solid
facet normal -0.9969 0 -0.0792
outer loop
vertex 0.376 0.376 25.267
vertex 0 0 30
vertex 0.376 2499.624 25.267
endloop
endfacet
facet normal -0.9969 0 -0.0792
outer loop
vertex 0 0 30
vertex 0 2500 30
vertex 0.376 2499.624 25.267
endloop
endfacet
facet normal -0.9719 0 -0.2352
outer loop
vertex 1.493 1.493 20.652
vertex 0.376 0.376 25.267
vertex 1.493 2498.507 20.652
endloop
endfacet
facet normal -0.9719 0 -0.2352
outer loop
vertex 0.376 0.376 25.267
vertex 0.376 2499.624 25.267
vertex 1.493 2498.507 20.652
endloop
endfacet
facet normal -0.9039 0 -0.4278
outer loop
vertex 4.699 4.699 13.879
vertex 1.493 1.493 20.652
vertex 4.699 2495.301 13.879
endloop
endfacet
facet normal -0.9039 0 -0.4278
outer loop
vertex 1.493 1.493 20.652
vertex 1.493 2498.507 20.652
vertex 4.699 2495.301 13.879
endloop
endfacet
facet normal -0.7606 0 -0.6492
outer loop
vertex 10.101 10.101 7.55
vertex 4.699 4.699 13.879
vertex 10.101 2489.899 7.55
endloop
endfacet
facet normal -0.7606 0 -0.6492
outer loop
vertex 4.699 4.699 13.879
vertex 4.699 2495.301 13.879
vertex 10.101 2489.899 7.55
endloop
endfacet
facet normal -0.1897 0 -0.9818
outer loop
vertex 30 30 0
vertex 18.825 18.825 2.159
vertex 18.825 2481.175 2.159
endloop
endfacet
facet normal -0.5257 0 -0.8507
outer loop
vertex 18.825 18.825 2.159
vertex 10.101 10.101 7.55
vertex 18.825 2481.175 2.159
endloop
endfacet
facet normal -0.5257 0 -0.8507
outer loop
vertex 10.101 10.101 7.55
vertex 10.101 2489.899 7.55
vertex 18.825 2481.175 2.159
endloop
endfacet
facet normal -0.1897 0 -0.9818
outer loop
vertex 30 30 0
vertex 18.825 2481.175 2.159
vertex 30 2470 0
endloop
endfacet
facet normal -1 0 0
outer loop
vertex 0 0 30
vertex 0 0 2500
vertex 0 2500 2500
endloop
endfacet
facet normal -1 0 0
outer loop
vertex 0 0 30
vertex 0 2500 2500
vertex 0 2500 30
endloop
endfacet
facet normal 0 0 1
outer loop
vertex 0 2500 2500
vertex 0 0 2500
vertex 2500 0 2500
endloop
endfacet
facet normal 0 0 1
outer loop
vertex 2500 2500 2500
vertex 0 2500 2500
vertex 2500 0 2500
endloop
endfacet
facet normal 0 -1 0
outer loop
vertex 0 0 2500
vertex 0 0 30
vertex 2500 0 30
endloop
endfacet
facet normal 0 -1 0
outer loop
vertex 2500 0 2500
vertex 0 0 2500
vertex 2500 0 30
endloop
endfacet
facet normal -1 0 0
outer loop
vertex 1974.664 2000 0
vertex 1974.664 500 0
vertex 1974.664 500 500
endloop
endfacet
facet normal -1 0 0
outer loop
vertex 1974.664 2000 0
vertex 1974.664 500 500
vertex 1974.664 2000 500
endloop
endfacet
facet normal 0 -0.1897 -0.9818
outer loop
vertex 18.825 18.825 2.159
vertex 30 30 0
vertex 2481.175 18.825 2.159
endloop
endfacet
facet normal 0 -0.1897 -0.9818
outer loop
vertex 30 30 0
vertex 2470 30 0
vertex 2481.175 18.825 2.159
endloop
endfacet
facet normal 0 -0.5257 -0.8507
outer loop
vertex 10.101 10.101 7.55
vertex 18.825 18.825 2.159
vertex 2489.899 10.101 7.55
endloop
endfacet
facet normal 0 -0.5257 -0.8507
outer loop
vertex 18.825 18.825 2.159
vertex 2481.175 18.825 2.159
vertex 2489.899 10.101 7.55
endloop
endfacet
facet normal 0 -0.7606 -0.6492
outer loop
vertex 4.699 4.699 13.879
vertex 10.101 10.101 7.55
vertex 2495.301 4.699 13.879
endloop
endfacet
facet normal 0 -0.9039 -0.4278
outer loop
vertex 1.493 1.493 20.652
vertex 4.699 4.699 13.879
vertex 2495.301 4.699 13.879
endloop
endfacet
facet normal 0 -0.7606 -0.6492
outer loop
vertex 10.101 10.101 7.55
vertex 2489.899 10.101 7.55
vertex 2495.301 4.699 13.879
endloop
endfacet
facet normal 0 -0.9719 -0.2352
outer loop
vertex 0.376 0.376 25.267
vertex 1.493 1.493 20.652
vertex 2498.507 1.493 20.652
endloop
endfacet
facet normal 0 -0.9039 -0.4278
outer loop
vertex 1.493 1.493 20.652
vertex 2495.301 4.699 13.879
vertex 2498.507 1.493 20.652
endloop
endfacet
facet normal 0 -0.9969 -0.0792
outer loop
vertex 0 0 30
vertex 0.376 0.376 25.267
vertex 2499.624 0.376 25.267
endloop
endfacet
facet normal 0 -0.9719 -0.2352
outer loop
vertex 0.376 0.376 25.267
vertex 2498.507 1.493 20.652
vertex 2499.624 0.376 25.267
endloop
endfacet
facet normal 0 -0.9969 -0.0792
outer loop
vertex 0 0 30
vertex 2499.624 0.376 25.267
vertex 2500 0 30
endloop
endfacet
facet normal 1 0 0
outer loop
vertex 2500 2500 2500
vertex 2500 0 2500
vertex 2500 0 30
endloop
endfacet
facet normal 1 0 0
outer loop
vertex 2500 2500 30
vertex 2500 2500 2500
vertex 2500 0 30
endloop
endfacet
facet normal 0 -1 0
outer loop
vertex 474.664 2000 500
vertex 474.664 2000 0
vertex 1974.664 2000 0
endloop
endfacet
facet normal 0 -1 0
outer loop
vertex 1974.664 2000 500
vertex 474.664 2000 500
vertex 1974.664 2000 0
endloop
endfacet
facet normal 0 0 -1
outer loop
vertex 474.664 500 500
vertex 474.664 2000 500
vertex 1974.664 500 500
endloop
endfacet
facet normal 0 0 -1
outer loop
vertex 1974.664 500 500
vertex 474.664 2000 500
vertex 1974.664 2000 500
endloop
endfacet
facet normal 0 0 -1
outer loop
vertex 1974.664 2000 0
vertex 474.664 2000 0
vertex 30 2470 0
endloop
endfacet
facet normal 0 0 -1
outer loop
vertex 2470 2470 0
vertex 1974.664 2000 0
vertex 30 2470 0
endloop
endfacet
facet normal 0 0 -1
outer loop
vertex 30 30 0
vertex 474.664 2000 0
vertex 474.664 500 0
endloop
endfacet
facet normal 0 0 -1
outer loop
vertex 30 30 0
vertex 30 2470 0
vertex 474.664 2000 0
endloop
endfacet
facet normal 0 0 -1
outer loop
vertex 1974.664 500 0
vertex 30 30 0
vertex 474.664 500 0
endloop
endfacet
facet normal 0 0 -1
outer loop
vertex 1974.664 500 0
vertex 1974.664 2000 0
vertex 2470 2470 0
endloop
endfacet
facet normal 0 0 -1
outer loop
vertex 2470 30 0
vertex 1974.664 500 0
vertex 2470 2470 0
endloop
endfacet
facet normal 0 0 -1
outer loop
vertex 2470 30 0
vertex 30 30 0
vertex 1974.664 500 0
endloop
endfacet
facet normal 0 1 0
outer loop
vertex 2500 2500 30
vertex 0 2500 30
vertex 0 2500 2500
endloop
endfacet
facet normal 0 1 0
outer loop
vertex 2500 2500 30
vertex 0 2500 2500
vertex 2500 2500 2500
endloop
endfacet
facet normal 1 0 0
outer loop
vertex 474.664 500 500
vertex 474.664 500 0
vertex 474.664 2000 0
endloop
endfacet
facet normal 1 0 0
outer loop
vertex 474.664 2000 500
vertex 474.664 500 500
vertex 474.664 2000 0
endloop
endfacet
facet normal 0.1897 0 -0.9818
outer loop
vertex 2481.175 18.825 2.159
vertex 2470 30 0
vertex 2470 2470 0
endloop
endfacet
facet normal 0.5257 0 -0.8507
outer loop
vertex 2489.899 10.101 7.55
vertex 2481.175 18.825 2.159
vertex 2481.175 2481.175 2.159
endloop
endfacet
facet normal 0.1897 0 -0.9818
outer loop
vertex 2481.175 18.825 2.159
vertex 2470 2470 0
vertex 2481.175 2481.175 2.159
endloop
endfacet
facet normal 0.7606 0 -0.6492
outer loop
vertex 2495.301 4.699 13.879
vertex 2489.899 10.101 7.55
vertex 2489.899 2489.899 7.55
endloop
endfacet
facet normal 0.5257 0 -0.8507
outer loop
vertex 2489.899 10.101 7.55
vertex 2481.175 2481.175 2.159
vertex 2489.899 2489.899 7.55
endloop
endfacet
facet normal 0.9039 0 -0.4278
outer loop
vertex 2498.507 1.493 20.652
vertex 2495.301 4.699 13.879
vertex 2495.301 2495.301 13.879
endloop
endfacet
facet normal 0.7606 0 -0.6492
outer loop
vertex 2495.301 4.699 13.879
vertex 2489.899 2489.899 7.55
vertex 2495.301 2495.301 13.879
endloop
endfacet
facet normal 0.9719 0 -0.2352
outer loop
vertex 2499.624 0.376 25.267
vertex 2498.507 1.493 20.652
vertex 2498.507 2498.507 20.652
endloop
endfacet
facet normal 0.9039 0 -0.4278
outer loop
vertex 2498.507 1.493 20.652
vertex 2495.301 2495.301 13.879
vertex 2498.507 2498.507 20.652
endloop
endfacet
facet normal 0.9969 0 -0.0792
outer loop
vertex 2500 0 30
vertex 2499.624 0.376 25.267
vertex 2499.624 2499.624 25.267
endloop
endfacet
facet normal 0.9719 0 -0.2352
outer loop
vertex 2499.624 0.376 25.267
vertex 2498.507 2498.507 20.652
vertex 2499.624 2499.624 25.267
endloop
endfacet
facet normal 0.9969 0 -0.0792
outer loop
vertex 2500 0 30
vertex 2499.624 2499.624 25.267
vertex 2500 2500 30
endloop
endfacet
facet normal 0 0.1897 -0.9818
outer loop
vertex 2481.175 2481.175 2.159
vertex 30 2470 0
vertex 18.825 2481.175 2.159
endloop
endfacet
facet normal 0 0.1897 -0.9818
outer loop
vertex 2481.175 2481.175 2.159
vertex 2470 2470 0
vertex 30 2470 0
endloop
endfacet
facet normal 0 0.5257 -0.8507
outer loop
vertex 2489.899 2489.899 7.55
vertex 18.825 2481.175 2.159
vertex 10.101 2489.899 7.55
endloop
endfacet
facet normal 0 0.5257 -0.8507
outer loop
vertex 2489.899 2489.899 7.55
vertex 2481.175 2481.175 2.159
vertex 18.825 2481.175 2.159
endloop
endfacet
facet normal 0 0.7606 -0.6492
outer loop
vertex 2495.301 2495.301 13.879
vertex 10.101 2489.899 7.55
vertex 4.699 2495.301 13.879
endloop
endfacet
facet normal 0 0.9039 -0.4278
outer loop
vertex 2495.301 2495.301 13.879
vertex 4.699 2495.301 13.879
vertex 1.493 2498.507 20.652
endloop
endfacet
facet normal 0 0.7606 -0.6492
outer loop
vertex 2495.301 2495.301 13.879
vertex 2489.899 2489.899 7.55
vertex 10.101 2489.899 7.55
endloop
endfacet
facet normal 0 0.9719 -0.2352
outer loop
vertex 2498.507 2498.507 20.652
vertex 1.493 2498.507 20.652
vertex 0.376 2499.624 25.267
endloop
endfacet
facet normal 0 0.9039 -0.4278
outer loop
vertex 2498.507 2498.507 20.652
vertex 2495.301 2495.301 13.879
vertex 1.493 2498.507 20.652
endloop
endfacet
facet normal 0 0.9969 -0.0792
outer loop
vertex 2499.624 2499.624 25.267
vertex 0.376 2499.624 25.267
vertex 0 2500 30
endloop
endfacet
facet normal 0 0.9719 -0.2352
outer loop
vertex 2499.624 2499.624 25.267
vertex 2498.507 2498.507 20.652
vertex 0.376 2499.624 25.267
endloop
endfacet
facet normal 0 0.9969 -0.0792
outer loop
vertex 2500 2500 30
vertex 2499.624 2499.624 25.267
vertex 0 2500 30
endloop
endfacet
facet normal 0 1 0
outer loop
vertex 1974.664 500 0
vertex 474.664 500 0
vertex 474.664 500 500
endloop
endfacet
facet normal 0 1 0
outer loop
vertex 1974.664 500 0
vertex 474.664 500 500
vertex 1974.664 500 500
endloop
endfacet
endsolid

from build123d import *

# Parameters (mm, degrees)
SKETCH2_W           = 2500
SKETCH2_H           = 2500
BOSS_EXTRUDE1_DEPTH = 2500
SKETCH6_W           = 1500
SKETCH6_H           = 1500
CUT_EXTRUDE9_DEPTH  = 500
FILLET2_R           = 30


with BuildPart() as part:
    # Sketch2 → Boss-Extrude1 (new body)
    with BuildSketch(Plane(origin=(0, 0, 0), x_dir=(1, 0, 0), z_dir=(0, 1, 0))):
        with Locations((1250, -1250)):
            Rectangle(SKETCH2_W, SKETCH2_H)
    extrude(amount=BOSS_EXTRUDE1_DEPTH)

    # Sketch6 → Cut-Extrude9 (cut)
    with BuildSketch(Plane.XY):
        with Locations((1224.663925487, 1250)):
            Rectangle(SKETCH6_W, SKETCH6_H)
    extrude(amount=CUT_EXTRUDE9_DEPTH, mode=Mode.SUBTRACT)

    # Fillet2
    fillet2_edges = [part.edges().sort_by_distance(p)[0] for p in [
        (1250, 2500, 0),
        (1250, 0, 0),
        (0, 1250, 0),
        (2500, 1250, 0),
    ]]
    fillet(fillet2_edges, radius=FILLET2_R)


solid = part.part
